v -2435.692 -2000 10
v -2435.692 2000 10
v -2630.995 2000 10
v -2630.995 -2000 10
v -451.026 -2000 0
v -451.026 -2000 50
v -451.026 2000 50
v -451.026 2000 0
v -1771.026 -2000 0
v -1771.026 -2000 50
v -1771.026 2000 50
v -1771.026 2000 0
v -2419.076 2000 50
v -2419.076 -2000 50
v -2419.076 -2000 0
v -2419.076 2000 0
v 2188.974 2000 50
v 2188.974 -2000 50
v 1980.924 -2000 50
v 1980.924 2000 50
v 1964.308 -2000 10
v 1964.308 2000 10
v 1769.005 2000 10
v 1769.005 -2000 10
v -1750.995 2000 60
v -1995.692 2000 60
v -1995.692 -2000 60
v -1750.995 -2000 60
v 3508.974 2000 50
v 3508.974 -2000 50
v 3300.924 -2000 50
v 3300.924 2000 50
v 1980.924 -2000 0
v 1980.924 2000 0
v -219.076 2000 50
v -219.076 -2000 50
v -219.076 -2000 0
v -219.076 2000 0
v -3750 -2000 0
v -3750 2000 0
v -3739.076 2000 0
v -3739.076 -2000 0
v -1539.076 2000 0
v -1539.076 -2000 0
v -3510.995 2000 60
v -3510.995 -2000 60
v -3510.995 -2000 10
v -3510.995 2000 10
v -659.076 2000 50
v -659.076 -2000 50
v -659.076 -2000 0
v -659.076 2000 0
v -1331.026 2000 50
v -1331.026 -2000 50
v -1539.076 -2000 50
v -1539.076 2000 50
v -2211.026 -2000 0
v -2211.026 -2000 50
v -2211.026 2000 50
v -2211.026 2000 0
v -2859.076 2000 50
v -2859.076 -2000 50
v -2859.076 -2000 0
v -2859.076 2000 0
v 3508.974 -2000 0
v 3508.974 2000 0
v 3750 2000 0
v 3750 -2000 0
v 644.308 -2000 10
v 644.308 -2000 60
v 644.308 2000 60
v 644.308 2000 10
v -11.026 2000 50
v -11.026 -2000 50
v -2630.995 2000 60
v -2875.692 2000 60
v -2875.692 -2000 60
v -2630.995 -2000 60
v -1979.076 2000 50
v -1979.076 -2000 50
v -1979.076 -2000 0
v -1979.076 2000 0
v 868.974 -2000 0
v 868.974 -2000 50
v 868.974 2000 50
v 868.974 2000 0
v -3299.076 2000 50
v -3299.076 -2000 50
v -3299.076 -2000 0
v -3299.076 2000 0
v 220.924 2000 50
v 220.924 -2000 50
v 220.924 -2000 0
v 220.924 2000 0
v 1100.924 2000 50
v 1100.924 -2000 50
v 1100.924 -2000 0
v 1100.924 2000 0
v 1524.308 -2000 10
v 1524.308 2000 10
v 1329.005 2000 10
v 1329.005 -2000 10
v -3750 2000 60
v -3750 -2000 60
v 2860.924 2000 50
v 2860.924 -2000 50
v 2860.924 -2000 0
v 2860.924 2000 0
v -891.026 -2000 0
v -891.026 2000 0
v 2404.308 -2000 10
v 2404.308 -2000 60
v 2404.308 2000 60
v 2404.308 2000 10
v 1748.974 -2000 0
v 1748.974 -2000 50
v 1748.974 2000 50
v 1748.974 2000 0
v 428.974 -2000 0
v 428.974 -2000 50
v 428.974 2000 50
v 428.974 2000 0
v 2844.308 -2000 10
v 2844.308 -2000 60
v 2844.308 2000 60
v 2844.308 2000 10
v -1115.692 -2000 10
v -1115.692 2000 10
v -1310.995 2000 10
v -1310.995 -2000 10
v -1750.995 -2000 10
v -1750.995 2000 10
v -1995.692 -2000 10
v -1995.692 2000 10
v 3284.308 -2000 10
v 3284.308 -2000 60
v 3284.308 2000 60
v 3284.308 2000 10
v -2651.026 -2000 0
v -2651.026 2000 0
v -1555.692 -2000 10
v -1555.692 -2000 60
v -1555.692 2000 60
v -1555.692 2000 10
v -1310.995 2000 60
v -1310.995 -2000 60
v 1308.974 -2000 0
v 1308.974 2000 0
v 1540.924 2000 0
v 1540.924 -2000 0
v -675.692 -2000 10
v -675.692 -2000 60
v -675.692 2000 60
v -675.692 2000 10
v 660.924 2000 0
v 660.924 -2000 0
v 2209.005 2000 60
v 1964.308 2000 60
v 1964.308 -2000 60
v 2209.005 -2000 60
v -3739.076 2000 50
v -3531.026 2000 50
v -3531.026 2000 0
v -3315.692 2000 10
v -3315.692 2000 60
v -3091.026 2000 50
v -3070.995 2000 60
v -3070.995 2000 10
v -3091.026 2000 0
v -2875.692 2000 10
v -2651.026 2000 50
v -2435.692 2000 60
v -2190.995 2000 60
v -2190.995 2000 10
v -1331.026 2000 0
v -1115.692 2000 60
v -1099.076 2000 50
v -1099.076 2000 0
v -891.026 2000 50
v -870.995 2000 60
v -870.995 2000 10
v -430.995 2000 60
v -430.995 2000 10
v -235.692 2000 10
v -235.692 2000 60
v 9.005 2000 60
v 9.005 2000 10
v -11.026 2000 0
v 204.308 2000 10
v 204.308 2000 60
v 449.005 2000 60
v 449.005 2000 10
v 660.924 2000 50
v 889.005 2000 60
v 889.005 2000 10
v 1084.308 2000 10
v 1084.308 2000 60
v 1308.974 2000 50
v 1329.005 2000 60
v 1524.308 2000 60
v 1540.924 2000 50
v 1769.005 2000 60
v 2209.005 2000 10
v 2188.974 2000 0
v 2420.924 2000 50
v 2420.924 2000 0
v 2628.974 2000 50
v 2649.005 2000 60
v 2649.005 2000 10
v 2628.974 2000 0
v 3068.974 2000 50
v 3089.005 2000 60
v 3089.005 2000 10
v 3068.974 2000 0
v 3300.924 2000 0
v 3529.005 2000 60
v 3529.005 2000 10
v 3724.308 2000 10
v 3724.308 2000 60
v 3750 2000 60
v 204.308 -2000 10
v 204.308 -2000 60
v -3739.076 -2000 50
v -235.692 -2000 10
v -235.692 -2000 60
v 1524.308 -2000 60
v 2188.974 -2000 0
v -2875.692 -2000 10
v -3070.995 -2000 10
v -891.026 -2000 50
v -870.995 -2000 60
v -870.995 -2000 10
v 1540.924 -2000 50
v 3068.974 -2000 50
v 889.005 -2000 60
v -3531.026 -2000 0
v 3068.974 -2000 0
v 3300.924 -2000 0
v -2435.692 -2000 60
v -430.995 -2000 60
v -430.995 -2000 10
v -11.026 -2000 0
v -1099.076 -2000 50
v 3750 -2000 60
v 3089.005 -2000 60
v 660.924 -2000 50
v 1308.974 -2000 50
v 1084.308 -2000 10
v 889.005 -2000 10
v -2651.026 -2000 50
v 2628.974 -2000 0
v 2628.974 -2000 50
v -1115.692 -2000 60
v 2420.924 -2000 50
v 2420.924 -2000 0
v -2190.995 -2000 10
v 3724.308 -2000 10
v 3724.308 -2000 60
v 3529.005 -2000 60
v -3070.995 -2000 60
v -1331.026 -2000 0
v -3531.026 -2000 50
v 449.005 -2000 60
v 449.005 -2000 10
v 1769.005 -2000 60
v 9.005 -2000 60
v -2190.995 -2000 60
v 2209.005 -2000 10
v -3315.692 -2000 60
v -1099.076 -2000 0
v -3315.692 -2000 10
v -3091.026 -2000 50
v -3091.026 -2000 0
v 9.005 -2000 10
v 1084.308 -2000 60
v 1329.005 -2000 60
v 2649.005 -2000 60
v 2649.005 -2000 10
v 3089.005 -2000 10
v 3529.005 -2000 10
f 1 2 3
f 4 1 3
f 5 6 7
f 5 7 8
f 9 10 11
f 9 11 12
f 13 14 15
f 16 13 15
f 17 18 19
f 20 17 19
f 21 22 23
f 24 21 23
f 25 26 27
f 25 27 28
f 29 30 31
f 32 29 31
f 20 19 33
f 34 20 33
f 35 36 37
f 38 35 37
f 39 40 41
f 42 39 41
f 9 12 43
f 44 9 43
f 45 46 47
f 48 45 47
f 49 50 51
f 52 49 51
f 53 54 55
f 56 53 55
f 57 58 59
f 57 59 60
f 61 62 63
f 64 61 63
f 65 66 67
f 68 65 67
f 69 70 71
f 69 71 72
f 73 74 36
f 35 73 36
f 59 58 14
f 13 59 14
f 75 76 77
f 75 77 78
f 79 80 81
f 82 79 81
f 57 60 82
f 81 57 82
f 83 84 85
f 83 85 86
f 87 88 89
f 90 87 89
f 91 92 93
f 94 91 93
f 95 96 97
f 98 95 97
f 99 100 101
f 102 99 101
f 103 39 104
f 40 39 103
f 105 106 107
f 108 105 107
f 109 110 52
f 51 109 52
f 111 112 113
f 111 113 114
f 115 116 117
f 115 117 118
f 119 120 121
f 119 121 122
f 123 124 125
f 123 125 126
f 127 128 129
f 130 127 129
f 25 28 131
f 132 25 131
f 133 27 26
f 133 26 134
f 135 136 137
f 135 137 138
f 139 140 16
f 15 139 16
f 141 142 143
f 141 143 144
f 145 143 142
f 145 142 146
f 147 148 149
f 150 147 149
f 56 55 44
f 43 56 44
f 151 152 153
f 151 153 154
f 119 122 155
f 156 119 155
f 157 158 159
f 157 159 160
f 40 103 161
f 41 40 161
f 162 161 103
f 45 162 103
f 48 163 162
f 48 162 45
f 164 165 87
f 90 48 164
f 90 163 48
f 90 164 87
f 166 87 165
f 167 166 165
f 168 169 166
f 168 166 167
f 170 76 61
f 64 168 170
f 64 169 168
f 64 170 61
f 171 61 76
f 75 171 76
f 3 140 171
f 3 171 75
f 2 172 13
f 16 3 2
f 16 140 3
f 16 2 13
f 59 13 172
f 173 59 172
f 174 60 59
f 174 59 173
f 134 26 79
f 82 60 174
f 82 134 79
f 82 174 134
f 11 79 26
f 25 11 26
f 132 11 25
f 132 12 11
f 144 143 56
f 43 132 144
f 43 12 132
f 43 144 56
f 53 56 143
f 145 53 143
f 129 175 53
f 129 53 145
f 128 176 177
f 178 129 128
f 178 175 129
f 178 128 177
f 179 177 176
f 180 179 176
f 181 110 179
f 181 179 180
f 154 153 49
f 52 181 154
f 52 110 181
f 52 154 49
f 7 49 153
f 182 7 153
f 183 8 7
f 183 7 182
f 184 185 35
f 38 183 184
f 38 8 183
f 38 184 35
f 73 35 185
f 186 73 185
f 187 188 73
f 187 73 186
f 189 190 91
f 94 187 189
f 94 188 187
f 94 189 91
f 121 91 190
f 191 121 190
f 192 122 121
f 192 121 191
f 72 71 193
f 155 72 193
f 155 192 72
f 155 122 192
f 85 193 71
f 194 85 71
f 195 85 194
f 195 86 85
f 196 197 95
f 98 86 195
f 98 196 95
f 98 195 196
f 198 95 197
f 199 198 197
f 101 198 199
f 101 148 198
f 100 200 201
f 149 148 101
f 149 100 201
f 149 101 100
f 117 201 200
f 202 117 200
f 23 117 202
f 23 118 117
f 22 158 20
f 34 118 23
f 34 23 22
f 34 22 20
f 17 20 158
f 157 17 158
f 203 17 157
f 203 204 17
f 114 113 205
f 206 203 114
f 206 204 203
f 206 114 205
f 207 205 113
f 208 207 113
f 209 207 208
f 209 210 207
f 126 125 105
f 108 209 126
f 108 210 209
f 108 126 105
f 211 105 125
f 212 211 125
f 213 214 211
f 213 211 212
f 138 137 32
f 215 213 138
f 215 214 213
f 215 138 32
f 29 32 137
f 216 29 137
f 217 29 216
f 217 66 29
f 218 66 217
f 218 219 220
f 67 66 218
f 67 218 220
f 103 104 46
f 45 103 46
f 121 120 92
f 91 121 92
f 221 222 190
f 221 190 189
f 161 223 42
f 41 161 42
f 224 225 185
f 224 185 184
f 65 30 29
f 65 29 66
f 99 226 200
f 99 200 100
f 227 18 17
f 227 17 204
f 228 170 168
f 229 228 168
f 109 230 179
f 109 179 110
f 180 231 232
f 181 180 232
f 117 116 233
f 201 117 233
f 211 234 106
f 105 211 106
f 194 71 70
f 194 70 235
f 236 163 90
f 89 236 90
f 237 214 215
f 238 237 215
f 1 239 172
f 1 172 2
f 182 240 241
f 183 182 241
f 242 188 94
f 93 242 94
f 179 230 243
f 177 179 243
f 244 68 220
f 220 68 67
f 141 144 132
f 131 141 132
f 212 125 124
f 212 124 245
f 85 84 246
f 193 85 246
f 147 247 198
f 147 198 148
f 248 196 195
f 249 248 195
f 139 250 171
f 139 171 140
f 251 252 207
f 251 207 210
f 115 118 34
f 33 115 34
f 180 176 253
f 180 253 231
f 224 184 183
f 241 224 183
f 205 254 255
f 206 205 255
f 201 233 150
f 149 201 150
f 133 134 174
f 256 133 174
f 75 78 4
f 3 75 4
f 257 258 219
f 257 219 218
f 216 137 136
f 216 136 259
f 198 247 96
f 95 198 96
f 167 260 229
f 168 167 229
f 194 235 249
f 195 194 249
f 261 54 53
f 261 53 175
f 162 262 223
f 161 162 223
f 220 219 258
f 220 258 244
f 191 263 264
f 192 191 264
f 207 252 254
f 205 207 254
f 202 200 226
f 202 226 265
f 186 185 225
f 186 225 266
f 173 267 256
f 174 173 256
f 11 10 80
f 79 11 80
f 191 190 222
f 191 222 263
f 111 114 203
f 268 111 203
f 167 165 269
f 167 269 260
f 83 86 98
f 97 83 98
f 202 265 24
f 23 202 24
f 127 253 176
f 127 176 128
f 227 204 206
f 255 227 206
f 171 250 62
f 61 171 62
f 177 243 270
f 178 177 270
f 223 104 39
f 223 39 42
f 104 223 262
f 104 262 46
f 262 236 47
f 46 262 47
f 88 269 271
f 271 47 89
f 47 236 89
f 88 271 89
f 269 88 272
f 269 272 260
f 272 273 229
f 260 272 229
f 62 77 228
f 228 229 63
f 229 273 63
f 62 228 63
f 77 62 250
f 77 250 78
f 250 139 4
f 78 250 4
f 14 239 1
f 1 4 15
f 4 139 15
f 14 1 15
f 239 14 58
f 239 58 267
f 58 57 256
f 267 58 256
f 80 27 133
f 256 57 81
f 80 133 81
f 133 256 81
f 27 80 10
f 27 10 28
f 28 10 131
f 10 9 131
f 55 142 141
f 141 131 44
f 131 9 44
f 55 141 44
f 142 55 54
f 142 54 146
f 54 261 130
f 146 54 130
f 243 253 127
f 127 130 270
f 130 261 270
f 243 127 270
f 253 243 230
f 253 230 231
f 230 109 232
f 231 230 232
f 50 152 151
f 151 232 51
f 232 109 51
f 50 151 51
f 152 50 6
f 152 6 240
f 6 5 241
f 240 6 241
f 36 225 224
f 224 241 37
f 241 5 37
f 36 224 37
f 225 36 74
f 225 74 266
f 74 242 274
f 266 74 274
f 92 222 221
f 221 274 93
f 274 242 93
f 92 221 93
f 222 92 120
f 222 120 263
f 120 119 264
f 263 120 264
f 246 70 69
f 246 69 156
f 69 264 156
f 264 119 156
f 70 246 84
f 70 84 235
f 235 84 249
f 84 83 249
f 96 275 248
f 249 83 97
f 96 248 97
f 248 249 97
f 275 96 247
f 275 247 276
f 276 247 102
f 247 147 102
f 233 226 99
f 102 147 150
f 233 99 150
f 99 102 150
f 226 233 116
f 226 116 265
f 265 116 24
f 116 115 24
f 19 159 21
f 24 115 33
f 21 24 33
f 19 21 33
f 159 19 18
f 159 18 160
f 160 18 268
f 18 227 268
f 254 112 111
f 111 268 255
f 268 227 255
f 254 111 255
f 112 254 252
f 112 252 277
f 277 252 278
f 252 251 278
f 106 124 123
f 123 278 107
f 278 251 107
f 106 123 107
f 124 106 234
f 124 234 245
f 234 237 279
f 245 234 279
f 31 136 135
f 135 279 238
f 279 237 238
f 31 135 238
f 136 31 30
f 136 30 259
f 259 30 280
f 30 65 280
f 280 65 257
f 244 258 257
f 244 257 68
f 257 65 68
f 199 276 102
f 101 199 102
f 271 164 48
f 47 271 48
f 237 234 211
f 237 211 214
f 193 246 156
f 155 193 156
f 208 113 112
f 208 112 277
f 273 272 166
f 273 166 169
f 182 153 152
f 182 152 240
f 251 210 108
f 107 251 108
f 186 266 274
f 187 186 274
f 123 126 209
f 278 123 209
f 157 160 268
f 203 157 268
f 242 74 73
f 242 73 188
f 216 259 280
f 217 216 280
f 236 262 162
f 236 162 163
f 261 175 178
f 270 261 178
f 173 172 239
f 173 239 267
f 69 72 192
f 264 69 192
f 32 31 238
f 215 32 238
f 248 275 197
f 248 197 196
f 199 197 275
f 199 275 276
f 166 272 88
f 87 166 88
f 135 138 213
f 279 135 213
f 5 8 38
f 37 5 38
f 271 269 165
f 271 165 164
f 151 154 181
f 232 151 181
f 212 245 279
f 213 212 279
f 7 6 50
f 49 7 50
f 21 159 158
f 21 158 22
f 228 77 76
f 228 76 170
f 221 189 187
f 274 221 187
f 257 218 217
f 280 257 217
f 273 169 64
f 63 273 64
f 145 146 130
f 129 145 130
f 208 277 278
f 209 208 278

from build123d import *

# Parameters (mm, degrees)
SKETCH1_W           = 7500
SKETCH1_H           = 4000
BOSS_EXTRUDE1_DEPTH = 60
SKETCH2_W           = 208.04993412
SKETCH2_H           = 50
SKETCH2_W_2         = 195.302892205
CUT_EXTRUDE1_DEPTH  = 5107


with BuildPart() as part:
    # Sketch1 → Boss-Extrude1 (new body)
    with BuildSketch(Plane.XY):
        Rectangle(SKETCH1_W, SKETCH1_H)
    extrude(amount=BOSS_EXTRUDE1_DEPTH)

    # Sketch2 → Cut-Extrude1 (cut)
    with BuildSketch(Plane(origin=(0, -2000, 0), x_dir=(-1, 0, 0), z_dir=(0, -1, 0))):
        with Locations((3635.051095731, -25)):
            Rectangle(SKETCH2_W, SKETCH2_H)
        with Locations((3413.343616701, -35)):
            Rectangle(SKETCH2_W_2, SKETCH2_H)
        with Locations((3195.051095731, -25)):
            Rectangle(SKETCH2_W, SKETCH2_H)
        with Locations((2973.343616701, -35)):
            Rectangle(SKETCH2_W_2, SKETCH2_H)
        with Locations((2755.051095731, -25)):
            Rectangle(SKETCH2_W, SKETCH2_H)
        with Locations((2533.343616701, -35)):
            Rectangle(SKETCH2_W_2, SKETCH2_H)
        with Locations((2315.051095731, -25)):
            Rectangle(SKETCH2_W, SKETCH2_H)
        with Locations((2093.343616701, -35)):
            Rectangle(SKETCH2_W_2, SKETCH2_H)
        with Locations((1875.051095731, -25)):
            Rectangle(SKETCH2_W, SKETCH2_H)
        with Locations((1653.343616701, -35)):
            Rectangle(SKETCH2_W_2, SKETCH2_H)
        with Locations((1435.051095731, -25)):
            Rectangle(SKETCH2_W, SKETCH2_H)
        with Locations((1213.343616701, -35)):
            Rectangle(SKETCH2_W_2, SKETCH2_H)
        with Locations((995.051095731, -25)):
            Rectangle(SKETCH2_W, SKETCH2_H)
        with Locations((773.343616701, -35)):
            Rectangle(SKETCH2_W_2, SKETCH2_H)
        with Locations((555.051095731, -25)):
            Rectangle(SKETCH2_W, SKETCH2_H)
        with Locations((333.343616701, -35)):
            Rectangle(SKETCH2_W_2, SKETCH2_H)
        with Locations((115.051095731, -25)):
            Rectangle(SKETCH2_W, SKETCH2_H)
        with Locations((-106.6563833, -35)):
            Rectangle(SKETCH2_W_2, SKETCH2_H)
        with Locations((-324.948904269, -25)):
            Rectangle(SKETCH2_W, SKETCH2_H)
        with Locations((-546.6563833, -35)):
            Rectangle(SKETCH2_W_2, SKETCH2_H)
        with Locations((-764.948904269, -25)):
            Rectangle(SKETCH2_W, SKETCH2_H)
        with Locations((-986.6563833, -35)):
            Rectangle(SKETCH2_W_2, SKETCH2_H)
        with Locations((-1204.948904269, -25)):
            Rectangle(SKETCH2_W, SKETCH2_H)
        with Locations((-1426.6563833, -35)):
            Rectangle(SKETCH2_W_2, SKETCH2_H)
        with Locations((-1644.948904269, -25)):
            Rectangle(SKETCH2_W, SKETCH2_H)
        with Locations((-1866.6563833, -35)):
            Rectangle(SKETCH2_W_2, SKETCH2_H)
        with Locations((-2084.948904269, -25)):
            Rectangle(SKETCH2_W, SKETCH2_H)
        with Locations((-2306.6563833, -35)):
            Rectangle(SKETCH2_W_2, SKETCH2_H)
        with Locations((-2524.948904269, -25)):
            Rectangle(SKETCH2_W, SKETCH2_H)
        with Locations((-2746.6563833, -35)):
            Rectangle(SKETCH2_W_2, SKETCH2_H)
        with Locations((-2964.948904269, -25)):
            Rectangle(SKETCH2_W, SKETCH2_H)
        with Locations((-3186.6563833, -35)):
            Rectangle(SKETCH2_W_2, SKETCH2_H)
        with Locations((-3404.948904269, -25)):
            Rectangle(SKETCH2_W, SKETCH2_H)
        with Locations((-3626.6563833, -35)):
            Rectangle(SKETCH2_W_2, SKETCH2_H)
    extrude(amount=-CUT_EXTRUDE1_DEPTH, mode=Mode.SUBTRACT)


solid = part.part
